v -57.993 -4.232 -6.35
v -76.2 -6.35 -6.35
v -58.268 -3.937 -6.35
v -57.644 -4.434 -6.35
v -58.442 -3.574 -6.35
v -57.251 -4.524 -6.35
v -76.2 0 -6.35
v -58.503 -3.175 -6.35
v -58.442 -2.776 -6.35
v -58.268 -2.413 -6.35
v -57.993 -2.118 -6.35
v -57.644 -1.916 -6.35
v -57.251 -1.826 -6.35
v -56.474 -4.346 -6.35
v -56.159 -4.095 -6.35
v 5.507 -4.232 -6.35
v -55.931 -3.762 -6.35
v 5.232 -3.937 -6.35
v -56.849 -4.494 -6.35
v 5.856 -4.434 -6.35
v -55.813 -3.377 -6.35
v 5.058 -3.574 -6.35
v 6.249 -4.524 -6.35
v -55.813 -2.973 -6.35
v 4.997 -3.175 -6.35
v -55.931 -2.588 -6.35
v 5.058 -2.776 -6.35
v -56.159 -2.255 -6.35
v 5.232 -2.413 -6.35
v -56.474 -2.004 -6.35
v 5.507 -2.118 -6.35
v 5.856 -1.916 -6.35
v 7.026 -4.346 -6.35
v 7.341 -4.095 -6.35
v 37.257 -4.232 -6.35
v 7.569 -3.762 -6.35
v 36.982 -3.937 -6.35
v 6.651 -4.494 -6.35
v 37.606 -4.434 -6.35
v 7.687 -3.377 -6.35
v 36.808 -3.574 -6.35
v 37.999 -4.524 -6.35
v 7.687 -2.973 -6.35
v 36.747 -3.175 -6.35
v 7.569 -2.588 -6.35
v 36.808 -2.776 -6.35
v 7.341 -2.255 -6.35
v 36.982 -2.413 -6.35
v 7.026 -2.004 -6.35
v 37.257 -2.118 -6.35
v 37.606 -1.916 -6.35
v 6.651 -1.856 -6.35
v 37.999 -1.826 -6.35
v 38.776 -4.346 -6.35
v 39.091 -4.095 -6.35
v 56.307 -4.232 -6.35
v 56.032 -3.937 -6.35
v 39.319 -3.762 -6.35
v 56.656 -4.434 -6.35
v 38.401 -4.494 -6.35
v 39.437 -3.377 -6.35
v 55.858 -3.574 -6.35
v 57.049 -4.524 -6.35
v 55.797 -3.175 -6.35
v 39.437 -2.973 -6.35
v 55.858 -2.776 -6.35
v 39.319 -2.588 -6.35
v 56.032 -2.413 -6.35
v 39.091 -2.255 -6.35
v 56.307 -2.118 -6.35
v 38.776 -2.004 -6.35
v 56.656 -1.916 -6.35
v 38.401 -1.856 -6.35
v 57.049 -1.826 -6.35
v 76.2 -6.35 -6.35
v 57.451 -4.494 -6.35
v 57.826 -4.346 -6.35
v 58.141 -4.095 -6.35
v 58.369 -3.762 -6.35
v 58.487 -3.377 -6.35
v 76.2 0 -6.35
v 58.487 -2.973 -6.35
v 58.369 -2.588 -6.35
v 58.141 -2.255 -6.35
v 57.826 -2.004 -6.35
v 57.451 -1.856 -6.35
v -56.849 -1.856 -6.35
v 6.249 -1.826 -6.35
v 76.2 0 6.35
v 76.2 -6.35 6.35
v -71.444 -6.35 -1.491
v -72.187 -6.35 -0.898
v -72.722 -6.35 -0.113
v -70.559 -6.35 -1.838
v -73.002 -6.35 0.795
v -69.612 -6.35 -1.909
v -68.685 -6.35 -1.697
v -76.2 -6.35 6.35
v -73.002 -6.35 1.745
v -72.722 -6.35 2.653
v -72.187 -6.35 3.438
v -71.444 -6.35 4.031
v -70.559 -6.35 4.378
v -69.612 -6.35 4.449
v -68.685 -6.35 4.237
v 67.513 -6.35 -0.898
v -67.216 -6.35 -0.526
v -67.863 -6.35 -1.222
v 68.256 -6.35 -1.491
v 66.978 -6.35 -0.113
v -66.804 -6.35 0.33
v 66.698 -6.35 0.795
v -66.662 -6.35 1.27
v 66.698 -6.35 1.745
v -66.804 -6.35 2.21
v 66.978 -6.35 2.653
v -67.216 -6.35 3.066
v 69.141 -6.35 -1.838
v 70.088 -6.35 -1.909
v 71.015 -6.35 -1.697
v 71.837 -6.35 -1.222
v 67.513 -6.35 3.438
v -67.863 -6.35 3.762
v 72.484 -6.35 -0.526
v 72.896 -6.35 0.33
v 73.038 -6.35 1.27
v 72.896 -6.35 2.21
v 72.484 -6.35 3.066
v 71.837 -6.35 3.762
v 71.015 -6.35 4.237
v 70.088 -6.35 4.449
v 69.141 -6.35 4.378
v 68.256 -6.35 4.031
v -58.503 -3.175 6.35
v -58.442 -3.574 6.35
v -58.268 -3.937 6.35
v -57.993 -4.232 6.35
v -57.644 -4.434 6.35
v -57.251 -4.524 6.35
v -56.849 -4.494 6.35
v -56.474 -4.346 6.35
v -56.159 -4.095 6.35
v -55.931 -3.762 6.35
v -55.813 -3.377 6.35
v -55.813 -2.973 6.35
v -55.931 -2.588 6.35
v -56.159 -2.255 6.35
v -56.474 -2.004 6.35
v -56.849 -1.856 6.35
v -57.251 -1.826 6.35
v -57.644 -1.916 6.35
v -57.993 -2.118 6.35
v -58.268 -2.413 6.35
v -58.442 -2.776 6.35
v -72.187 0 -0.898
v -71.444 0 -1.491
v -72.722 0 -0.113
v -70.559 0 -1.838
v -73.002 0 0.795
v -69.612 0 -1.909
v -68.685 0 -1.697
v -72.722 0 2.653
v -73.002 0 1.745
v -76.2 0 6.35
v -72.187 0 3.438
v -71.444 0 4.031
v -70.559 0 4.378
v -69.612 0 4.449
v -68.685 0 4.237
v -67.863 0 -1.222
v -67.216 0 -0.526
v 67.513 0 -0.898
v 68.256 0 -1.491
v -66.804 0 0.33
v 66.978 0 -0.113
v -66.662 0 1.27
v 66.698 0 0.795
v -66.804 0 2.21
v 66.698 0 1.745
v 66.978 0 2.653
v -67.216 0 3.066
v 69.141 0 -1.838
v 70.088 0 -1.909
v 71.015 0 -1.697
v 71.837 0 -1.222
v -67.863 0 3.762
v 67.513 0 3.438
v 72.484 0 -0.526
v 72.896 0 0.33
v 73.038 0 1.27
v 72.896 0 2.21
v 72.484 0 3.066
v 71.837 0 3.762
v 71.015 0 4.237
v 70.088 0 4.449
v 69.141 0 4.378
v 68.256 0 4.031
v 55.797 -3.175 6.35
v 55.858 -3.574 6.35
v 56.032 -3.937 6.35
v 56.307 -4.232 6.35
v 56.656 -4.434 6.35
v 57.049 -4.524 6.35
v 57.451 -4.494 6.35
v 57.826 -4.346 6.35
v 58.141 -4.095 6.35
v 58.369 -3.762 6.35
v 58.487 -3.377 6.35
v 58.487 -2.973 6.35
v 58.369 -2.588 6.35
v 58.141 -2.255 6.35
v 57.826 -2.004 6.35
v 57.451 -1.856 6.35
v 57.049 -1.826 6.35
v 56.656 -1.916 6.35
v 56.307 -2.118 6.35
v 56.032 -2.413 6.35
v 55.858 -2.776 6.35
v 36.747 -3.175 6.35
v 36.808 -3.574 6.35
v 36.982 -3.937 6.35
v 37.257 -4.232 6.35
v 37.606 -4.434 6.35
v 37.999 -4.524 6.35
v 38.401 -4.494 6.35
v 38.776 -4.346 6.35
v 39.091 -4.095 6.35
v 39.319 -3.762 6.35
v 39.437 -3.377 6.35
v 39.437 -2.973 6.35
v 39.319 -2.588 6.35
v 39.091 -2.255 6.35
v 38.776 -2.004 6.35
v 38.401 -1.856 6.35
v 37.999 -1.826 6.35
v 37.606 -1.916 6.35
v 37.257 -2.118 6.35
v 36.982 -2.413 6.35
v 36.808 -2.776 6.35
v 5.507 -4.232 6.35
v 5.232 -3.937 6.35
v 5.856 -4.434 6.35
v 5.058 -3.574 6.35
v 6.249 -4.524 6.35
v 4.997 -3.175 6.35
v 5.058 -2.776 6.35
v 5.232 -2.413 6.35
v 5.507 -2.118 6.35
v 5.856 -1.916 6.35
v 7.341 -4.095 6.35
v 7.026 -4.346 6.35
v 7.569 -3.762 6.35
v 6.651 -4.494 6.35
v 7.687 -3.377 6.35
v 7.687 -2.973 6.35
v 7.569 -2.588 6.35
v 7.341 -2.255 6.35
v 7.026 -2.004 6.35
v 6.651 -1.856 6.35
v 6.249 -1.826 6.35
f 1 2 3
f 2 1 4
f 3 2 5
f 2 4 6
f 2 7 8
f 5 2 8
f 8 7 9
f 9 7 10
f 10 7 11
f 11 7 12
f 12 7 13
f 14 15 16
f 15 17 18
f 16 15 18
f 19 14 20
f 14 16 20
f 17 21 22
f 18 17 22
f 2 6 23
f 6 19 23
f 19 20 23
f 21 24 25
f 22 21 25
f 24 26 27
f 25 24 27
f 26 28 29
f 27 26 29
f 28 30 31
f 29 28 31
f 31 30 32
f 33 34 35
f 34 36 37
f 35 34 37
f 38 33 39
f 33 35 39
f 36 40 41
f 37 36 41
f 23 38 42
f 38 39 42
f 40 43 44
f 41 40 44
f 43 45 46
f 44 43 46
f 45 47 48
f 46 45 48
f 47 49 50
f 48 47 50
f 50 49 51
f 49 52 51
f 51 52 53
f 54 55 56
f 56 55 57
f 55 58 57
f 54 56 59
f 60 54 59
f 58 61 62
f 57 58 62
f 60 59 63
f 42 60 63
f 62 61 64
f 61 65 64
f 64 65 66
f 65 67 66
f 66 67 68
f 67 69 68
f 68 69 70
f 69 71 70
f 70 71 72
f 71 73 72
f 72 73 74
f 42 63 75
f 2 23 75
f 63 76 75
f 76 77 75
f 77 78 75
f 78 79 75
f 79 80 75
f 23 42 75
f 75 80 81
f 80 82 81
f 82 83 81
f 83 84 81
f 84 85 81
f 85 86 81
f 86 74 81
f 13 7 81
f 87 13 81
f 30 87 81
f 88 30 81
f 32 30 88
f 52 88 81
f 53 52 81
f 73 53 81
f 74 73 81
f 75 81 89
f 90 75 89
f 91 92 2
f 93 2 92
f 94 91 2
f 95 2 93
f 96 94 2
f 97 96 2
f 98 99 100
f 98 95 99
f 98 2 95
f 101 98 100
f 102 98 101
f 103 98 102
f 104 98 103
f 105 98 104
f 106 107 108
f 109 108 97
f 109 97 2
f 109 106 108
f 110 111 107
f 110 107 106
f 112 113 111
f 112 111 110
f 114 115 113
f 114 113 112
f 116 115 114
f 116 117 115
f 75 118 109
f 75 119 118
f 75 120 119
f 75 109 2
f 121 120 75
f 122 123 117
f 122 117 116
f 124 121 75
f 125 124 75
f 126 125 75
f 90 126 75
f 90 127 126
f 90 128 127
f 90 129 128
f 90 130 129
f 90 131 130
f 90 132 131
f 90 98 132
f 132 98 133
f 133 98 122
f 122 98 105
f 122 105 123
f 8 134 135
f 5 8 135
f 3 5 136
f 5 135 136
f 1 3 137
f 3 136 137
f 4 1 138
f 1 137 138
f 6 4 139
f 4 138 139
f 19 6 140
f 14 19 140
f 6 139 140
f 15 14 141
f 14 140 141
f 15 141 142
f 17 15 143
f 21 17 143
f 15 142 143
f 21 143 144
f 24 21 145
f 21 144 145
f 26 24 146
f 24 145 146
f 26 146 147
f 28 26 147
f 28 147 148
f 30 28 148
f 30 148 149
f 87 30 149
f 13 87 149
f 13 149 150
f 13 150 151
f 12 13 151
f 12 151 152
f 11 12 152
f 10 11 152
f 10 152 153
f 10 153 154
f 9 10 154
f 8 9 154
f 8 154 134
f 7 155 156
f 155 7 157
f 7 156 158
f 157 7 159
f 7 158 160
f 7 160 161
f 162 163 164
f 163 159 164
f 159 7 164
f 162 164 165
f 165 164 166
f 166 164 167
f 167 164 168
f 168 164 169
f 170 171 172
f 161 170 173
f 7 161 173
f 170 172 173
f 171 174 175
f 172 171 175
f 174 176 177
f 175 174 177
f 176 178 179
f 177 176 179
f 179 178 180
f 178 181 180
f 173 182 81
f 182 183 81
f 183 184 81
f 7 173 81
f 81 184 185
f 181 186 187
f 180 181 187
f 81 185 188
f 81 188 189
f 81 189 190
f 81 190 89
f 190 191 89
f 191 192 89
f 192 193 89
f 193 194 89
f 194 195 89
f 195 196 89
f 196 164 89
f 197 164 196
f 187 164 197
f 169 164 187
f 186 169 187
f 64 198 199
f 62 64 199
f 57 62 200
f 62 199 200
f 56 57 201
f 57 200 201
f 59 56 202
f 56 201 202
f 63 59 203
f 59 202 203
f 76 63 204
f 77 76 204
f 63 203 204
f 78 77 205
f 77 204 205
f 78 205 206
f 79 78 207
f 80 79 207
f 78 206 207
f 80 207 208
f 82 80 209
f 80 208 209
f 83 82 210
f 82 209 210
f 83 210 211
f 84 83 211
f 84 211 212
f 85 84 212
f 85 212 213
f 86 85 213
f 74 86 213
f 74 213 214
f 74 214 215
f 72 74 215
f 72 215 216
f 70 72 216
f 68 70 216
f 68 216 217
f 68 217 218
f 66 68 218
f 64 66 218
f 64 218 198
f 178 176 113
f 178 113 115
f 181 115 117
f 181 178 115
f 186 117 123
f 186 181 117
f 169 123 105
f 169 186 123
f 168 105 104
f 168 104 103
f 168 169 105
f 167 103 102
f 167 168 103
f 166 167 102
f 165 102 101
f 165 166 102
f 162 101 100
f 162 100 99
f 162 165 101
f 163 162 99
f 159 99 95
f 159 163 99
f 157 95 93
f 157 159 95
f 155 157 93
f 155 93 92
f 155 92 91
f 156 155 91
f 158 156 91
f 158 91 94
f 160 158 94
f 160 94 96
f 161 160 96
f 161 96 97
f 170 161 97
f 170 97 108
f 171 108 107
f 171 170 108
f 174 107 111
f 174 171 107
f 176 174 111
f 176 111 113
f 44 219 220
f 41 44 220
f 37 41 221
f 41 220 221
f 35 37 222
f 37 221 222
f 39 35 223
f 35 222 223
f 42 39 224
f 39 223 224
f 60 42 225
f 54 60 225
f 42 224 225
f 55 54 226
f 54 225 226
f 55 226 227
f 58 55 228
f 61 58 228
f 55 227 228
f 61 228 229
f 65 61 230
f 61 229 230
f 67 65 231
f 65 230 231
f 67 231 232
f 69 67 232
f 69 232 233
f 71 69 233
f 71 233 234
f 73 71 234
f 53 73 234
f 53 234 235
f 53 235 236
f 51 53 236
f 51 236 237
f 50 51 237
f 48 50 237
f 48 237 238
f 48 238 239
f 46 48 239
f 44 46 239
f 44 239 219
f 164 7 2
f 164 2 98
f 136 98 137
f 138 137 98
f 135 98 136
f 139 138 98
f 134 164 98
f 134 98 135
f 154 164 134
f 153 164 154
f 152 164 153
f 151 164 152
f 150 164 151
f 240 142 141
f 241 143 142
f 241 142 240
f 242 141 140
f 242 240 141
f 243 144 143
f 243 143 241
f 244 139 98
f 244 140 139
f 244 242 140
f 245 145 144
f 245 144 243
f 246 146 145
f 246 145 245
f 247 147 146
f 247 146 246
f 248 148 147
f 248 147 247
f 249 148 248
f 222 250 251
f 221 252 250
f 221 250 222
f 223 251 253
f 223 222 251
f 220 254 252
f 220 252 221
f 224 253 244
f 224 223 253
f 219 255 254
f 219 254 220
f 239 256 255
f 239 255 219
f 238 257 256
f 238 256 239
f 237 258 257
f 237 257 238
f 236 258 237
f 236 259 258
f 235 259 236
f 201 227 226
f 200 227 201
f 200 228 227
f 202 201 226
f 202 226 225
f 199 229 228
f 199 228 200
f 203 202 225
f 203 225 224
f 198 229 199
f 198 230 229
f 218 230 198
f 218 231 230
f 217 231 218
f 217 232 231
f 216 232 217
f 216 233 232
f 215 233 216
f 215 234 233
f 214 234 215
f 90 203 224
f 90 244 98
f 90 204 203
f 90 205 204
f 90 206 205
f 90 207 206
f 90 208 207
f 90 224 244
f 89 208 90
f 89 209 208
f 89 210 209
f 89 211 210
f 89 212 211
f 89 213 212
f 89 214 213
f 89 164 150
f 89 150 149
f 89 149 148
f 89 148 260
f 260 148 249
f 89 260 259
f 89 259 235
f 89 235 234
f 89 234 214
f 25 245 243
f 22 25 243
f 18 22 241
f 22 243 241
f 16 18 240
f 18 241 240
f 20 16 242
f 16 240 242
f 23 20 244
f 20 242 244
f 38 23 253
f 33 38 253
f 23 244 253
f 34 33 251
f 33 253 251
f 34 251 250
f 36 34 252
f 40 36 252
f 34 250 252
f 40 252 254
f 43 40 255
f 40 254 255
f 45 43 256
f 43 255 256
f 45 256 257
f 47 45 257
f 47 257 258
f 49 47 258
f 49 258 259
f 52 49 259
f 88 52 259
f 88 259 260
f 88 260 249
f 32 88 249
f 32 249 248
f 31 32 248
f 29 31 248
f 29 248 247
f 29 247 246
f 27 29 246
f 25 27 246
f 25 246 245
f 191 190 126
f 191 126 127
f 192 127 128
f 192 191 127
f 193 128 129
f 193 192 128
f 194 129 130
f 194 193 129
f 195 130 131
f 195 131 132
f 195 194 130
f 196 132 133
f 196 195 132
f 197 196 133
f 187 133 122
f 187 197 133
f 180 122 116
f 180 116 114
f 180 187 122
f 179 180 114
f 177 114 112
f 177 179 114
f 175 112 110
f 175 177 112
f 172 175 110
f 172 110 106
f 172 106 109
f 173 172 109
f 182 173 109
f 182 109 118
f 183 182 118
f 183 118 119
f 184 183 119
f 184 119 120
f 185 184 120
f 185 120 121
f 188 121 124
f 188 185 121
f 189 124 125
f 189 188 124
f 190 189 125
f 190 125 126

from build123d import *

# Parameters (mm, degrees)
F0_W     = 152.4
F0_H     = 12.7
F0_R     = 3.1877
F1_DEPTH = 6.35
F3_D     = 2.7051
F4_D     = 2.7051
F5_D     = 2.7051


with BuildPart() as f1:
    # F0 (on Front) → F1 (new body)
    with BuildSketch(Plane.XZ):
        Rectangle(F0_W, F0_H)
        with Locations((-69.85, 1.27)):
            Circle(F0_R, mode=Mode.SUBTRACT)
        with Locations((69.85, 1.27)):
            Circle(F0_R, mode=Mode.SUBTRACT)
    extrude(amount=F1_DEPTH)

    # F3 (through all)
    with Locations(Plane(origin=(0, 0, -6.35), x_dir=(1, 0, 0), z_dir=(0, 0, -1))):
        with Locations((-57.15, 3.175), (57.15, 3.175)):
            Hole(F3_D / 2)

    # F4 (through all)
    with Locations(Plane(origin=(0, 0, -6.35), x_dir=(1, 0, 0), z_dir=(0, 0, -1))):
        with Locations((6.35, 3.175)):
            Hole(F4_D / 2)

    # F5 (through all)
    with Locations(Plane(origin=(0, 0, -6.35), x_dir=(1, 0, 0), z_dir=(0, 0, -1))):
        with Locations((38.1, 3.175)):
            Hole(F5_D / 2)


solid = f1.part
